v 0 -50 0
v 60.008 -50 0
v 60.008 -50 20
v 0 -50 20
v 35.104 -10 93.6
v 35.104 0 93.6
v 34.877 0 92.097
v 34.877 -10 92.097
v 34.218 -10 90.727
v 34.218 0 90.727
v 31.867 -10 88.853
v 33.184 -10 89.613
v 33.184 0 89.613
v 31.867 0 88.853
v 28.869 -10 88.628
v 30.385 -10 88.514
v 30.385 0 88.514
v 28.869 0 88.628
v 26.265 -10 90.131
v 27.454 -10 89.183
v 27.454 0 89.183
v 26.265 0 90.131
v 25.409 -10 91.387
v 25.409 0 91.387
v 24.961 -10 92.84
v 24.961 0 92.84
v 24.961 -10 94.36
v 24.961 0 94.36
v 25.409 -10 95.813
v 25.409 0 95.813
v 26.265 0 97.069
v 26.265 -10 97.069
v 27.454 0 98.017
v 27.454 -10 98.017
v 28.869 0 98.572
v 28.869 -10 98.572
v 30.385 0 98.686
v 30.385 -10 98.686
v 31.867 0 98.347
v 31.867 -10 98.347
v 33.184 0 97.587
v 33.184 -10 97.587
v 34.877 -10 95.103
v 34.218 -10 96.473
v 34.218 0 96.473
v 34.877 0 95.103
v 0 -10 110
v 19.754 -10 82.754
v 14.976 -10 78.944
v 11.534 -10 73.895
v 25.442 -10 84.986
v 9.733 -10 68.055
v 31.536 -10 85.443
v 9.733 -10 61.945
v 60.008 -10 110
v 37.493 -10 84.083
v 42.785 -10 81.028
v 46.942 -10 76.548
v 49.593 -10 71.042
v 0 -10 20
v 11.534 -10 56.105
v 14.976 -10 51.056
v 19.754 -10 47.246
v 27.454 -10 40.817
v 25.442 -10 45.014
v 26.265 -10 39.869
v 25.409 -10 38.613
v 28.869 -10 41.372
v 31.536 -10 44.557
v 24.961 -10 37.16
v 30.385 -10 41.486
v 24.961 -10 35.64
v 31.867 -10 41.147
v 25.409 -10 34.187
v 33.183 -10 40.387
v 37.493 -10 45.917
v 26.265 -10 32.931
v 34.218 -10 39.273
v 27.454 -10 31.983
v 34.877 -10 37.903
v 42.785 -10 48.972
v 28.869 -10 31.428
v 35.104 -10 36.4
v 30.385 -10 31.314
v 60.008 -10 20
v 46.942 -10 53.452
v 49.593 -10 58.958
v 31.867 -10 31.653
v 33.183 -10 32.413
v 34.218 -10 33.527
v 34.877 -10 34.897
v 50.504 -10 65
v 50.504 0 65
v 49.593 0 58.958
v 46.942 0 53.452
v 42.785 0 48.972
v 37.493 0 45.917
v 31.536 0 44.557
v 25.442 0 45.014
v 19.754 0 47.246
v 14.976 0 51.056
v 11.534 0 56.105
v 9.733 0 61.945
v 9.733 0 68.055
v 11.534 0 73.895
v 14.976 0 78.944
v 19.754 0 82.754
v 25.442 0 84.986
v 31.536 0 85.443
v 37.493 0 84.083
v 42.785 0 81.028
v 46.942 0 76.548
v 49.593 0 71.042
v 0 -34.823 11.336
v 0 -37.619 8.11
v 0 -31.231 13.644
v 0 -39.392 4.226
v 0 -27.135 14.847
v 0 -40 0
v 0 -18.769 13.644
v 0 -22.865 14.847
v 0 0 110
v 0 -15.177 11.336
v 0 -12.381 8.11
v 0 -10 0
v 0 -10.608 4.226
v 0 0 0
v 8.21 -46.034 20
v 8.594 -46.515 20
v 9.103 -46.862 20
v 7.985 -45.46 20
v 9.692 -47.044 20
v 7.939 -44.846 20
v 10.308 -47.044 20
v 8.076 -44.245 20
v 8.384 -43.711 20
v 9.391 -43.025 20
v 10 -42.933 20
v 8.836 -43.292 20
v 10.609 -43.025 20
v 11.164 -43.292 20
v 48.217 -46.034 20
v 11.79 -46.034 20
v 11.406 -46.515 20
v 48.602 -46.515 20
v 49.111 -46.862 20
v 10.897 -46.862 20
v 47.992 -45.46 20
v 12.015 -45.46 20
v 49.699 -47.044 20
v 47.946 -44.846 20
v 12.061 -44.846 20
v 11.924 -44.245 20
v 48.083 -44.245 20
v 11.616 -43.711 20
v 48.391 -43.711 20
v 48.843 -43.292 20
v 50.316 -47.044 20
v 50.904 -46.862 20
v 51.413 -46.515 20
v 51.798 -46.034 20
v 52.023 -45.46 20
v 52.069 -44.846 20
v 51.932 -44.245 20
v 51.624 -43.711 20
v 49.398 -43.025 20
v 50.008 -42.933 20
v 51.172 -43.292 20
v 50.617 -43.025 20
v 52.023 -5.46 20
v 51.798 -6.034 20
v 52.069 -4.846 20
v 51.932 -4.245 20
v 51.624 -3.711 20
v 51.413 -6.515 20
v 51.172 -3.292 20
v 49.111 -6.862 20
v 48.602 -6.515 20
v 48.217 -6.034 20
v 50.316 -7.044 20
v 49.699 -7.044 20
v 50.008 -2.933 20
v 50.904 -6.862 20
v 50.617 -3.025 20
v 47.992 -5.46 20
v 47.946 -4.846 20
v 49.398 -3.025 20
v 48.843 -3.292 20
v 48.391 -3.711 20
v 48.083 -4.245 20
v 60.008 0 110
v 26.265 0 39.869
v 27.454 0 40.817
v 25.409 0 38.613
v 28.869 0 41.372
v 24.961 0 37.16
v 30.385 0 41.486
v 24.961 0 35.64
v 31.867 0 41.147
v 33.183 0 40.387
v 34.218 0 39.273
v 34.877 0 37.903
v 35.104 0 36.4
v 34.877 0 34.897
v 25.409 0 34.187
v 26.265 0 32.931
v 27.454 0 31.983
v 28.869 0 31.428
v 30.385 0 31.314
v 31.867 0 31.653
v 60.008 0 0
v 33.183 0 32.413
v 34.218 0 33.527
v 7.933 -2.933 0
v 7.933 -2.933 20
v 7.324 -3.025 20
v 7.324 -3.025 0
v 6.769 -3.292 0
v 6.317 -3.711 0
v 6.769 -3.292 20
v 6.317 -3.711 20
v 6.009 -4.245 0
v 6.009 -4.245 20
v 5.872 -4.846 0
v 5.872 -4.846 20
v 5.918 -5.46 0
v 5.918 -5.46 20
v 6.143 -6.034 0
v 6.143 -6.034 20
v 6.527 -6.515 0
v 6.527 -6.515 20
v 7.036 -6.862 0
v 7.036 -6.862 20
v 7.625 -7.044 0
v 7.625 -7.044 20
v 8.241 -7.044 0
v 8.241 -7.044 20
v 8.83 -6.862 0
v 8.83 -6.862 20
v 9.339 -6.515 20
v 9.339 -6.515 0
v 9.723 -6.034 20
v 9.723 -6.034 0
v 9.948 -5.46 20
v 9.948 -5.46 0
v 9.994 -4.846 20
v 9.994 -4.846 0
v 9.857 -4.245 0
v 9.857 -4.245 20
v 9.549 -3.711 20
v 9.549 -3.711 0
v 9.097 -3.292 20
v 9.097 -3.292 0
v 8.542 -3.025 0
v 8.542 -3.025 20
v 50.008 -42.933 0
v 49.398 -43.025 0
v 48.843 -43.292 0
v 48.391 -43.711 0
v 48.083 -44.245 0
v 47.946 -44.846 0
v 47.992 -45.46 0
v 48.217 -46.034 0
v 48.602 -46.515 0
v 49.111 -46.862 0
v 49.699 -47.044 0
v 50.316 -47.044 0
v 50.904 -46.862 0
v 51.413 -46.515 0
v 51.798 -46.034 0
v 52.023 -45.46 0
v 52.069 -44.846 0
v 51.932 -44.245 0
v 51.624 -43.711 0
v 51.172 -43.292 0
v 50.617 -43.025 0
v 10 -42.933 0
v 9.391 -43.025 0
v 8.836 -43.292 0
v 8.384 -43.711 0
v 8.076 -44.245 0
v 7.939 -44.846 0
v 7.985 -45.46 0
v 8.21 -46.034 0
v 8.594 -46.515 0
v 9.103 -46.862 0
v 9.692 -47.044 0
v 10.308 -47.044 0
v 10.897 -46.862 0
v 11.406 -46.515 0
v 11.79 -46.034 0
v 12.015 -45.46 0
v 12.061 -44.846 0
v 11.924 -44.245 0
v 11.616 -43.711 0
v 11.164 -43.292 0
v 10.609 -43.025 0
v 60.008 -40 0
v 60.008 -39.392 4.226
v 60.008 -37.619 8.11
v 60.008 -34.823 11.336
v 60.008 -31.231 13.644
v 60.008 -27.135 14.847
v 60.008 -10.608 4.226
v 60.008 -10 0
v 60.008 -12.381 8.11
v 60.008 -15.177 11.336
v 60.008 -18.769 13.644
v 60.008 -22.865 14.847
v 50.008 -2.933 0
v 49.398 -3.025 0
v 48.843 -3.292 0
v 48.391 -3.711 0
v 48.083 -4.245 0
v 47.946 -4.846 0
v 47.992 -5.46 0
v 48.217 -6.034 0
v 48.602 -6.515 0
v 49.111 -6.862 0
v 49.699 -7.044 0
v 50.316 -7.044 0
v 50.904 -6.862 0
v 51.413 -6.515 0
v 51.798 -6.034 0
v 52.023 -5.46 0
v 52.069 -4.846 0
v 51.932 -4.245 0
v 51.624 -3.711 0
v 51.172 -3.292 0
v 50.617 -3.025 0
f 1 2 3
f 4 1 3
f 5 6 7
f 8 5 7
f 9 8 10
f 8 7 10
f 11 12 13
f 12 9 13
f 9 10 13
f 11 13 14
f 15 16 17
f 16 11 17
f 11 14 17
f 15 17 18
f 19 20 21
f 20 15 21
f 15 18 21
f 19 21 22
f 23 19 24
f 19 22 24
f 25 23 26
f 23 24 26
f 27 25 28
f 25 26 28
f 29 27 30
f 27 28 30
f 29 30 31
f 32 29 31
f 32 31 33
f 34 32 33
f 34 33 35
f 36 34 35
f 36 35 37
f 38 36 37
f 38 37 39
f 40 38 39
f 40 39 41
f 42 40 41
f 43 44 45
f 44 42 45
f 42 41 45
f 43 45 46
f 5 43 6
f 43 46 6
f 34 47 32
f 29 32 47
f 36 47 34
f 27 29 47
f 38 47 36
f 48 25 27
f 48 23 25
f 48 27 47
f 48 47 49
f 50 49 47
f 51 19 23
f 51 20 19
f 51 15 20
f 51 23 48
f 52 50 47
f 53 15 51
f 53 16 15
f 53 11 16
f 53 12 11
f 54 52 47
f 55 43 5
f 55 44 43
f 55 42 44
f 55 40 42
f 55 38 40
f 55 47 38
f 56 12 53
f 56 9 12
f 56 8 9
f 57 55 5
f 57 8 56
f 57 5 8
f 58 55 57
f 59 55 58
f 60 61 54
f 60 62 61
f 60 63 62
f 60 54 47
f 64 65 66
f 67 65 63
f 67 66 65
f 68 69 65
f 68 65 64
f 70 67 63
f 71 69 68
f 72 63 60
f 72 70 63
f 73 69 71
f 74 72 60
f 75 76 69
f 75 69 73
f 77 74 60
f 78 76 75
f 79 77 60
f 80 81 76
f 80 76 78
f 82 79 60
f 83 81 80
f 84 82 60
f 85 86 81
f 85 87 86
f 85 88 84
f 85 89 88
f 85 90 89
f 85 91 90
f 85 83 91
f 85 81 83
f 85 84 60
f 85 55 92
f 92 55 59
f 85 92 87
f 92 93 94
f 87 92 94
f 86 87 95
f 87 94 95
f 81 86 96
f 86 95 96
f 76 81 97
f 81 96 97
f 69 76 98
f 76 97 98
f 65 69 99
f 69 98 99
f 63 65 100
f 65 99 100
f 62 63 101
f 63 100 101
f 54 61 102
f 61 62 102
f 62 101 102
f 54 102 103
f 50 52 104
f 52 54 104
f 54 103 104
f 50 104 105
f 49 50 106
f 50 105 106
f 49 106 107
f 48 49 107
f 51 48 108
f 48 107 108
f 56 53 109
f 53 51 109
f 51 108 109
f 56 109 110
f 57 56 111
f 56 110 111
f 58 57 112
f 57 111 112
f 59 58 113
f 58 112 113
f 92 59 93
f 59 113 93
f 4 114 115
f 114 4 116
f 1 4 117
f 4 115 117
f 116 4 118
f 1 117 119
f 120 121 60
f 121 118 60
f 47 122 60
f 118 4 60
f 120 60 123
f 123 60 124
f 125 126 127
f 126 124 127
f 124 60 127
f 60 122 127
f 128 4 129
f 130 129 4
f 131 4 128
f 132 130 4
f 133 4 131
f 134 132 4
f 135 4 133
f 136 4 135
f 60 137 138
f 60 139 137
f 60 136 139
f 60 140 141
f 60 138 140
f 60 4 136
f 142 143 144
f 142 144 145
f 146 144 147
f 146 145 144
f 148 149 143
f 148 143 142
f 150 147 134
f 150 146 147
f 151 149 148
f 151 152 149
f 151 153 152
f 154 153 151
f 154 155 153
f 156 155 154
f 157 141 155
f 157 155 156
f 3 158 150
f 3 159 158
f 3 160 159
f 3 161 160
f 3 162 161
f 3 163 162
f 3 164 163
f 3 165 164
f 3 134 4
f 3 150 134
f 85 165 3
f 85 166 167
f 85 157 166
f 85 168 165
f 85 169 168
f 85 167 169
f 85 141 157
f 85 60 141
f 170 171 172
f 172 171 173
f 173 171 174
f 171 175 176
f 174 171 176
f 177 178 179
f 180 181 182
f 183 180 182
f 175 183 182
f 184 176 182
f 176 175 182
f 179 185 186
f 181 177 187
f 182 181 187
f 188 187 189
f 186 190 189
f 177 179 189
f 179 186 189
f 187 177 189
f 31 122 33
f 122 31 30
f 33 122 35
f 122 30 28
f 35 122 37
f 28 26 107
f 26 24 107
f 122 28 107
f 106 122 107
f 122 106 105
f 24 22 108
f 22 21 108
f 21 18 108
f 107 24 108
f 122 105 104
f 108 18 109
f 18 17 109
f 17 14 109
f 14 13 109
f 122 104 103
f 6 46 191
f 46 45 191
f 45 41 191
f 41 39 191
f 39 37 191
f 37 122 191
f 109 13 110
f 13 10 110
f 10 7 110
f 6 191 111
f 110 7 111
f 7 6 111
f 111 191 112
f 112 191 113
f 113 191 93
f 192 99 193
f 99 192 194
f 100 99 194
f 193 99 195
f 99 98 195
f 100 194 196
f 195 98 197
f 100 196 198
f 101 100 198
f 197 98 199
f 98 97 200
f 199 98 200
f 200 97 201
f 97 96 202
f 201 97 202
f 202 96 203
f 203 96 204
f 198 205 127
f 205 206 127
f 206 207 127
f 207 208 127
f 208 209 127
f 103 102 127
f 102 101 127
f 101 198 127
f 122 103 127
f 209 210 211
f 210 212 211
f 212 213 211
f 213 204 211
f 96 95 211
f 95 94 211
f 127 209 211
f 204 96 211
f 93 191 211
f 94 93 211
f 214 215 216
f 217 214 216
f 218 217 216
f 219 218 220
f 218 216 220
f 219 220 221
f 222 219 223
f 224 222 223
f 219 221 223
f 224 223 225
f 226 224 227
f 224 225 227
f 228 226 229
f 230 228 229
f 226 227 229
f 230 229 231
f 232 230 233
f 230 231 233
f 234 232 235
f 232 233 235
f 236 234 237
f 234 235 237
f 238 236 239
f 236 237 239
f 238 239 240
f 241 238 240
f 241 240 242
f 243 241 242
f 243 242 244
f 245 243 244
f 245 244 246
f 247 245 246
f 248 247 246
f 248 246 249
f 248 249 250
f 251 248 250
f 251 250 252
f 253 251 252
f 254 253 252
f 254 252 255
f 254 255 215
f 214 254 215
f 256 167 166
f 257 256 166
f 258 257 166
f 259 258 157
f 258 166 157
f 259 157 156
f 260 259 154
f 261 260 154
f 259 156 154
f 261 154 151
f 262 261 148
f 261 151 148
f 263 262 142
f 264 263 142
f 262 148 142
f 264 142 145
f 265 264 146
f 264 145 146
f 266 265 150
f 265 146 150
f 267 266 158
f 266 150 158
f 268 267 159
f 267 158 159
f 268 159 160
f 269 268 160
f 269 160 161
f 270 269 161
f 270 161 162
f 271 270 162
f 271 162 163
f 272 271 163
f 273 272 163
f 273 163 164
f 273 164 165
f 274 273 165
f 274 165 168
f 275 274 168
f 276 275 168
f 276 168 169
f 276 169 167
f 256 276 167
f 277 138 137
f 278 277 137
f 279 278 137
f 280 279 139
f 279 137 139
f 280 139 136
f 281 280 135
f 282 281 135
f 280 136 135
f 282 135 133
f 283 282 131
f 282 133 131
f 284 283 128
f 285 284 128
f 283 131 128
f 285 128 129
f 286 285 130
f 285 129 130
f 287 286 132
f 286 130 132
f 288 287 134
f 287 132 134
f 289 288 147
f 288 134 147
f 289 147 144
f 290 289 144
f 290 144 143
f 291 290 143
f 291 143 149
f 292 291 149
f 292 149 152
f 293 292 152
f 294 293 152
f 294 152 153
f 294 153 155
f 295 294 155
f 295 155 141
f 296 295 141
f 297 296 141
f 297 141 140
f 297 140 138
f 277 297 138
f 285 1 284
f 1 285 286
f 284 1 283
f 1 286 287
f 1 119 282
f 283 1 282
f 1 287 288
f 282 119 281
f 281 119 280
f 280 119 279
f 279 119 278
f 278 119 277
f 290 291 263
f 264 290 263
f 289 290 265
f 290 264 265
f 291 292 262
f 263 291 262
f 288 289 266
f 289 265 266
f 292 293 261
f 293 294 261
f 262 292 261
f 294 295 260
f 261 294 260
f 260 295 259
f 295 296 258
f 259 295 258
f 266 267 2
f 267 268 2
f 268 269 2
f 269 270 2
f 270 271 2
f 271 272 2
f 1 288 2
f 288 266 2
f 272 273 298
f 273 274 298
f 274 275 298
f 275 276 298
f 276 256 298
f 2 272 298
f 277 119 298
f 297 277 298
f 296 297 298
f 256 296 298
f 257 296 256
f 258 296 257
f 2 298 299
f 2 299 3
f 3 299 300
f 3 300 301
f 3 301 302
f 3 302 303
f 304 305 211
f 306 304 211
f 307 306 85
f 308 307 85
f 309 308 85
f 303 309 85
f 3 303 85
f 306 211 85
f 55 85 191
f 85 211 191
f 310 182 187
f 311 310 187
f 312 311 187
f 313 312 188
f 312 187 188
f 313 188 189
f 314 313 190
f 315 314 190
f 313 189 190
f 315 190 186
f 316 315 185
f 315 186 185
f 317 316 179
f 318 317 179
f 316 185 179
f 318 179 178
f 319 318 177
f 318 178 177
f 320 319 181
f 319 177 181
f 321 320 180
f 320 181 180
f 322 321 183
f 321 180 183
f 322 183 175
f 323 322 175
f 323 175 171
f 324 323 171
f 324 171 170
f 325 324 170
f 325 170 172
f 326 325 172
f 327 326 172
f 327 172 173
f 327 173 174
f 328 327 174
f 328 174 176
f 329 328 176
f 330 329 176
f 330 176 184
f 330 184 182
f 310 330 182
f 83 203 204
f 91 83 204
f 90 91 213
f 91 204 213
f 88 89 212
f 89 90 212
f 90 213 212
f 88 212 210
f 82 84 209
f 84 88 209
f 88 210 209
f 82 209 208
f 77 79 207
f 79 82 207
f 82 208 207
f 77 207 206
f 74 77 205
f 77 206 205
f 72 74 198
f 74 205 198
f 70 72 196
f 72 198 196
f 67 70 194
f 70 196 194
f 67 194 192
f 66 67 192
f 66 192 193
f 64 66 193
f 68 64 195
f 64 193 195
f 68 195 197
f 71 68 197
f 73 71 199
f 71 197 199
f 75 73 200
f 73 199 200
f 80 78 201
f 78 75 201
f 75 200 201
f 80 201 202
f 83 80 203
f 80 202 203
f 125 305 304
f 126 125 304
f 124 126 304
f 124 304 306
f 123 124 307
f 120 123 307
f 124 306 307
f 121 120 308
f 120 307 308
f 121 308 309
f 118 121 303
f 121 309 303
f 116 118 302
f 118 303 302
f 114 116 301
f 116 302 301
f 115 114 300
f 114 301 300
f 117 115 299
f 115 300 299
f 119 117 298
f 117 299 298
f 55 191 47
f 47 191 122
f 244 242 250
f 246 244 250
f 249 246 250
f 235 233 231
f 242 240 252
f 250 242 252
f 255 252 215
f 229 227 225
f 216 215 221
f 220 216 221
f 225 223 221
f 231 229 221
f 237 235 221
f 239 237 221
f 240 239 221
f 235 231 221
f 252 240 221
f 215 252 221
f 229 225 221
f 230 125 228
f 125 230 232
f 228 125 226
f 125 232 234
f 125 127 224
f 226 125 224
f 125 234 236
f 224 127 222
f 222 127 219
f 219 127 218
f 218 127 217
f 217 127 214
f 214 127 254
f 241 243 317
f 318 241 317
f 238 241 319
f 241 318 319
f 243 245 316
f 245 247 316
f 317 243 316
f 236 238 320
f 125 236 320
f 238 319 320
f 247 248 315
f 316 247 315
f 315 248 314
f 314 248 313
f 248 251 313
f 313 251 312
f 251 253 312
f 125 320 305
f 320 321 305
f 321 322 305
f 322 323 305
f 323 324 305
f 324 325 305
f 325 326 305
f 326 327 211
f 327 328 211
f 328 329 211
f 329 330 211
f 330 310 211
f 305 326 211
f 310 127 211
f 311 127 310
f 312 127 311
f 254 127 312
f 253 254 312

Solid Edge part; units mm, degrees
sketch "Sketch1" plane through (0, 0, 0) normal (0, -1, 0) x (1, 0, 0)
  line L0 (60.0075, 0) -> (60.0075, 110)
  line L1 (60.0075, 110) -> (0, 110)
  line L2 (0, 110) -> (0, 0)
  line L3 (0, 0) -> (60.0075, 0)
  circle A0 centre (30.0038, 93.6) radius 5.1
  circle A1 centre (30.0037, 36.4) radius 5.1
  circle A2 centre (30.0037, 65) radius 20.5
  dimension "D1" = 60.0075
  dimension "D2" = 110
  dimension "D3" = 16.4
  dimension "D4" = 41
  dimension "D5" = 28.6
  dimension "D6" = 28.6
extrude "Protrusion1" add sketch "Sketch1" along normal blind 10
sketch "Sketch2" plane through (0, 0, 0) normal (0, -1, 0) x (1, 0, 0)
  line L0 (0, 20) -> (60.0075, 20)
  line L1 (60.0075, 20) -> (60.0075, 0)
  line L2 (60.0075, 0) -> (0, 0)
  line L3 (0, 0) -> (0, 20)
extrude "övre_fäste_protrusion" add sketch "Sketch2" along normal blind 50
sketch "Sketch3" plane through (60.0075, -20, 55) normal (1, 0, 0) x (0, 1, 0)
  circle A0 centre (-5, -55) radius 15
extrude "Halvcirkel_cutout" cut sketch "Sketch3" against normal blind 100
hole "Hole_1" at (10, -45, 0) direction (0, 0, 1) diameter 4.134 depth 20
hole "Hole1" at (50.0075, -45, 0) direction (0, 0, 1) diameter 4.134 depth 20
hole "Hole2" at (7.933, -5, 0) direction (0, 0, 1) diameter 4.134 depth 20
hole "Hole3" at (50.0075, -5, 0) direction (0, 0, 1) diameter 4.134 depth 20
